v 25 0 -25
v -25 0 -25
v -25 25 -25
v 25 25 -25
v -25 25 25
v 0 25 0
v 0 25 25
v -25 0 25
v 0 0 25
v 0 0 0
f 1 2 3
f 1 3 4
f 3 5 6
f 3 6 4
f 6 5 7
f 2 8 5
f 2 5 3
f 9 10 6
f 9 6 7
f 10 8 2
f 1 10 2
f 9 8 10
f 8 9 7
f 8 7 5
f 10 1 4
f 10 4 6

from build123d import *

# Parameters (mm, degrees)
F1_DEPTH = 25


with BuildPart() as f1:
    # F0 (on Front) → F1 (new body)
    with BuildSketch(Plane.XZ):
        Polygon((0, 0), (-25, 25), (-25, -25), (25, -25), align=None)
        Polygon((0, 25), (-25, 25), (0, 0), align=None)
    extrude(amount=-F1_DEPTH)


solid = f1.part
